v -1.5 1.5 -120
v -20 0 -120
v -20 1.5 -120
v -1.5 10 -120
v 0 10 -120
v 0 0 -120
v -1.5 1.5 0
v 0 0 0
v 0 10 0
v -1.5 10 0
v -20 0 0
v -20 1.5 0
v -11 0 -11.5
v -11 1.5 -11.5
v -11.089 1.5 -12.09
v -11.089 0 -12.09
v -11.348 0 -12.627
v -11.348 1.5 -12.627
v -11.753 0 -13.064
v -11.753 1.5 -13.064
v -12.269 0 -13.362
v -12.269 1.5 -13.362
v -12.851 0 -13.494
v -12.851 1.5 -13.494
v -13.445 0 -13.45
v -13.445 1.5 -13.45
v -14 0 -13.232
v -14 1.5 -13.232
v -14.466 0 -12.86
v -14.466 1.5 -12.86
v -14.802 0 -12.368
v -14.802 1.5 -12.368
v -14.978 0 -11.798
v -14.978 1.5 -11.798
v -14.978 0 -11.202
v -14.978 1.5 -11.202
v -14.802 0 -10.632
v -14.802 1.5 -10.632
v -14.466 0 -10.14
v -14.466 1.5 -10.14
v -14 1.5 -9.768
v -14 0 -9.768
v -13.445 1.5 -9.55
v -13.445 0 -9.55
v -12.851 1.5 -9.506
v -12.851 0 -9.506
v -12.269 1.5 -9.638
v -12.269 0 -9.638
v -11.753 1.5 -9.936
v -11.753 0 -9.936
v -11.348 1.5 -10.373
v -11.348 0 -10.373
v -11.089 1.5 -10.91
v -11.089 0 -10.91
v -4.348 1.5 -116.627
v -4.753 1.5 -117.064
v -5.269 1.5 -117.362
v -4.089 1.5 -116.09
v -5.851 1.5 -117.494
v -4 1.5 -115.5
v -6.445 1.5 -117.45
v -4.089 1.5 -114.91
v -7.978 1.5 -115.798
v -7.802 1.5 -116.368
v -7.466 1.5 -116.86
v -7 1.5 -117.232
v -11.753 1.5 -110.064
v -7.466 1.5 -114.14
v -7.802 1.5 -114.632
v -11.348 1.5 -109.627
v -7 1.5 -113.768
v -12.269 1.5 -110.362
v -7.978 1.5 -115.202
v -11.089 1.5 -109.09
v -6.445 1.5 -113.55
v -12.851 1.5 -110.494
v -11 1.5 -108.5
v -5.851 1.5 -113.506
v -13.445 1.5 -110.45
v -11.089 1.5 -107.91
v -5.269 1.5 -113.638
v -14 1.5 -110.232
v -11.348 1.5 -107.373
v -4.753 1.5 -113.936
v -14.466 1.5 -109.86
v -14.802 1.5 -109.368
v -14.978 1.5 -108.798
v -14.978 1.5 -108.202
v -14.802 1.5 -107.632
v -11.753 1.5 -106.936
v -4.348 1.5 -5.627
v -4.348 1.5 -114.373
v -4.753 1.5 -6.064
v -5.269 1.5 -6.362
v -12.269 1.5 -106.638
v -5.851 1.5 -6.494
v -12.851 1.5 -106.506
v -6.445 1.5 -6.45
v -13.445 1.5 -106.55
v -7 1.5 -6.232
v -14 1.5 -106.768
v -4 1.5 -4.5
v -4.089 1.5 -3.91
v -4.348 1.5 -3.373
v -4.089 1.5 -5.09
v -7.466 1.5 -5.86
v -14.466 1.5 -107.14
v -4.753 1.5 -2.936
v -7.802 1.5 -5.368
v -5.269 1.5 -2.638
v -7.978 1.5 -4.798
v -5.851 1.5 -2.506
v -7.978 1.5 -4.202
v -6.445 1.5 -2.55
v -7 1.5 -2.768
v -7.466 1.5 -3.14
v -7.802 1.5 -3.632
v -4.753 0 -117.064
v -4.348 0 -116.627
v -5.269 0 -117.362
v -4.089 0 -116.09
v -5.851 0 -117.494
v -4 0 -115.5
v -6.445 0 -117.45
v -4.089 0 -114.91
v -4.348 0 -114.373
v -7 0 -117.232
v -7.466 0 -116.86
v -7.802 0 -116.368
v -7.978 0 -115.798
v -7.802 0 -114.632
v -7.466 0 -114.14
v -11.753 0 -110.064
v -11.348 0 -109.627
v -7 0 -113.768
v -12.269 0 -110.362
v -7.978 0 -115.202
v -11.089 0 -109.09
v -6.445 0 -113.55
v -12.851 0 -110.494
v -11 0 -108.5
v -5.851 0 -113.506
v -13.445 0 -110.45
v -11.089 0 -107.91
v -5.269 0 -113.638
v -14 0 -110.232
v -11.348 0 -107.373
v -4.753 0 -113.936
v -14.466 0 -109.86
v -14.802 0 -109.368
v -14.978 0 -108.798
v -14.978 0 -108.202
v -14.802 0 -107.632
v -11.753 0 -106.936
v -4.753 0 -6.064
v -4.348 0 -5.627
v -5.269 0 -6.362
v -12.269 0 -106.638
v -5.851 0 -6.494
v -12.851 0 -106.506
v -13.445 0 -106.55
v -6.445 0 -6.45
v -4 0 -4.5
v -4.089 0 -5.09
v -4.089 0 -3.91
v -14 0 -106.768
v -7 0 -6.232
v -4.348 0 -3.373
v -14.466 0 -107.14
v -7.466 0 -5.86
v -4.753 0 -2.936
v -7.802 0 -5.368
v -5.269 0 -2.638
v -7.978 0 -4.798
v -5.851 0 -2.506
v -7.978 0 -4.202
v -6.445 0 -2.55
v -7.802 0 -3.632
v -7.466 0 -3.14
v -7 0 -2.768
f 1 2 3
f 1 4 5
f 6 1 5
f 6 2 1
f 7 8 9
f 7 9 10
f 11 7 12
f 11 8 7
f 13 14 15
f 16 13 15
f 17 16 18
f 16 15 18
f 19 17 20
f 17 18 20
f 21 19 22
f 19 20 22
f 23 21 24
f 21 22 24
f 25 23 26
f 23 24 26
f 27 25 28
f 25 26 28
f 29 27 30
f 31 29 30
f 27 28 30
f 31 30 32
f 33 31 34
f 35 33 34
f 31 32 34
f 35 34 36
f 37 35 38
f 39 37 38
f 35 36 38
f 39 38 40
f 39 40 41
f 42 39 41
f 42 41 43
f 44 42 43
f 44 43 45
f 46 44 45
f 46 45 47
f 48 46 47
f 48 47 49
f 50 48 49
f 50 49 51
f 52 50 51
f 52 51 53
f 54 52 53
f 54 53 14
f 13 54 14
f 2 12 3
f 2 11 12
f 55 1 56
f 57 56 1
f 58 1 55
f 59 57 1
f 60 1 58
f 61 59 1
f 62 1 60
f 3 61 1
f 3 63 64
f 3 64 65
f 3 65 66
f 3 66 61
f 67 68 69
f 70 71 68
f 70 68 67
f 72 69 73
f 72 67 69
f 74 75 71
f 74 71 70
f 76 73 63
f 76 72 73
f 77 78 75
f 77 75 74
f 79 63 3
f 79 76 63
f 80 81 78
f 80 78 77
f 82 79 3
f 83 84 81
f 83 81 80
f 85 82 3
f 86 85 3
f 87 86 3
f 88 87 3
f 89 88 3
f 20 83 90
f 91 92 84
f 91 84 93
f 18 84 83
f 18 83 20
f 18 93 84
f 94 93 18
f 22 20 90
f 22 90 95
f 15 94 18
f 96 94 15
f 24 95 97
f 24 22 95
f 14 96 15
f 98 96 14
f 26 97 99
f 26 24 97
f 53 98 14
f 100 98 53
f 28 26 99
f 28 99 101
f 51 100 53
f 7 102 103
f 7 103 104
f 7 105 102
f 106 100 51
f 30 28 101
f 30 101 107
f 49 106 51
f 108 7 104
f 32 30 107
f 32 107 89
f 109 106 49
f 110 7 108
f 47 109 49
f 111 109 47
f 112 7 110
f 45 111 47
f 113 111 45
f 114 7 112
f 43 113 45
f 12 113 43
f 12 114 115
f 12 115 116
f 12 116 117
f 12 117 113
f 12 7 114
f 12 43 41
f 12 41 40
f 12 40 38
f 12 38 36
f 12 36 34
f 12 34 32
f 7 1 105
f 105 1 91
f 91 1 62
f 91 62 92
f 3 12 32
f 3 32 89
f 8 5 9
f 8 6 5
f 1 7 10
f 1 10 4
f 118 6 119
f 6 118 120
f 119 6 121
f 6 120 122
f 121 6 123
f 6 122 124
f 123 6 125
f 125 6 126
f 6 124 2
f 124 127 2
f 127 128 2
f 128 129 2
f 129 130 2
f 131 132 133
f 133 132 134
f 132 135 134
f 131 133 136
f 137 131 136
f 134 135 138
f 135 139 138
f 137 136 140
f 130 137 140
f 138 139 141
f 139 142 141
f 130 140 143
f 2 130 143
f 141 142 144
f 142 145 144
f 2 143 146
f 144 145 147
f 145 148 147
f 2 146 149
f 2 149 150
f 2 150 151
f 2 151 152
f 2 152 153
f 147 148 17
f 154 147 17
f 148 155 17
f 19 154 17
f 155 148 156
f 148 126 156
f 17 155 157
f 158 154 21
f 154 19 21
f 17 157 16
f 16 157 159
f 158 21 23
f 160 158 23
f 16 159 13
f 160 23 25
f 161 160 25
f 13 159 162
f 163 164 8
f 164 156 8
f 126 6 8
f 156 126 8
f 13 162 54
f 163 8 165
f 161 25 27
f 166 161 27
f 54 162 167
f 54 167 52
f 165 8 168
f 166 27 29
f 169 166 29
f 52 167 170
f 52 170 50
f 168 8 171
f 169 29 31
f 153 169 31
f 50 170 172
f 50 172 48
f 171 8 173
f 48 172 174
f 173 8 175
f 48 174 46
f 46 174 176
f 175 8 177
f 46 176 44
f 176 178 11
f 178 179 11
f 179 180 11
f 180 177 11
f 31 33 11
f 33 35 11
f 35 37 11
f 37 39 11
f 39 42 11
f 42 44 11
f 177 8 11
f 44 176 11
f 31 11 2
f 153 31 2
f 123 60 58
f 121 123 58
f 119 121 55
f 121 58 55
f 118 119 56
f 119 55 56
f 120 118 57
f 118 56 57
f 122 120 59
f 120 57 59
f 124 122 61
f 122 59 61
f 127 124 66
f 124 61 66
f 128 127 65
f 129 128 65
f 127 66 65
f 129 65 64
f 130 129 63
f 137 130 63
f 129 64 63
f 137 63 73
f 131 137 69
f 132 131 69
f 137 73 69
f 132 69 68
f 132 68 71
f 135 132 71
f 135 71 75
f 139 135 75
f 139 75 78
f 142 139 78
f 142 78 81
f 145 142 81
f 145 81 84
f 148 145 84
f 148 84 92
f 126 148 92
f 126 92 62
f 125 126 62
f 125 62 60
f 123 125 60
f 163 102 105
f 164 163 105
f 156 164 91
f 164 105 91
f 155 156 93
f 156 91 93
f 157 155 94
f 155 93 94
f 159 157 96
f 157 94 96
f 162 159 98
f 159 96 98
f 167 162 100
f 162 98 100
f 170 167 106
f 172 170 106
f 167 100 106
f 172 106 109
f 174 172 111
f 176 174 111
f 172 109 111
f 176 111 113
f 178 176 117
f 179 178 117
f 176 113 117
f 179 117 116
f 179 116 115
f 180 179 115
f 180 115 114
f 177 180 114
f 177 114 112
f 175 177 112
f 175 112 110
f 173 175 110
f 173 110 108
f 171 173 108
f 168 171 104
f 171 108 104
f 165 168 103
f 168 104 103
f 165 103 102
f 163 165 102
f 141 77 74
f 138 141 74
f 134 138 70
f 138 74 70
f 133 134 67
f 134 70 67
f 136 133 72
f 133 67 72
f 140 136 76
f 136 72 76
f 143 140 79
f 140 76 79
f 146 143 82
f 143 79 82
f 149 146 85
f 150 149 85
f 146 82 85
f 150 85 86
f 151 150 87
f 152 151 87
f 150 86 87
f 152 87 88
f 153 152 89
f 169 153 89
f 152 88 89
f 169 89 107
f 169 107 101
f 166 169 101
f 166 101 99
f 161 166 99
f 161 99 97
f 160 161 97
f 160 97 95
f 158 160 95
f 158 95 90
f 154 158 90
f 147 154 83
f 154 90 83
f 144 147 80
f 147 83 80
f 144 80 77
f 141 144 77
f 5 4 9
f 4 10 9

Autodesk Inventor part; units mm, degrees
ref_plane "YZ Plane" through (0, 0, 0) normal (1, 0, 0) x (0, 1, 0)
ref_plane "XZ Plane" through (0, 0, 0) normal (0, 1, 0) x (-1, 0, 0)
ref_plane "XY Plane" through (0, 0, 0) normal (0, 0, 1) x (1, 0, 0)
sketch "Sketch1" plane through (0, 0, 0) normal (0, 1, 0) x (-1, 0, 0)
  line L0 (0, 0) -> (20, 0)
  line L1 (20, 0) -> (20, -120)
  line L2 (20, -120) -> (0, -120)
  line L3 (0, -120) -> (0, 0)
  dimension "d0" = 20
  dimension "d1" = 120
extrude "Extrusion1" add sketch "Sketch1" along normal blind 1.5
sketch "Sketch2" plane through (0, 0, 0) normal (0, -1, 0) x (1, 0, 0)
  line L0 (0, 0) -> (-1.5, 0)
  line L1 (-1.5, 0) -> (-1.5, -120)
  line L2 (-1.5, -120) -> (0, -120)
  line L3 (0, -120) -> (0, 0)
  dimension "d4" = 1.5
  dimension "d5" = 120
extrude "Extrusion2" add sketch "Sketch2" against normal blind 10
sketch "Sketch3" plane through (0, 1.5, 0) normal (0, 1, 0) x (1, 0, 0)
  line L0 (-20, 120) -> (-20, 0) projected
  line L1 (-20, 120) -> (-1.5, 120)
  line L2 (-1.5, 120) -> (-1.5, 101.5)
  line L3 (-1.5, 101.5) -> (-20, 101.5)
  line L4 (-20, 101.5) -> (-20, 120)
  line L5 (-20, 0) -> (-1.5, 0)
  line L6 (-1.5, 0) -> (-1.5, 18.5)
  line L7 (-1.5, 18.5) -> (-20, 18.5)
  line L8 (-20, 18.5) -> (-20, 0)
  line L9 (-20, 101.5) -> (-13, 101.5)
  line L10 (-13, 101.5) -> (-13, 108.5)
  line L11 (-13, 108.5) -> (-20, 108.5)
  line L12 (-20, 108.5) -> (-20, 101.5)
  line L13 (-20, 101.5) -> (-6, 101.5)
  line L14 (-6, 101.5) -> (-6, 115.5)
  line L15 (-6, 115.5) -> (-20, 115.5)
  line L16 (-20, 115.5) -> (-20, 101.5)
  circle A0 centre (-6, 115.5) radius 2
  circle A1 centre (-13, 108.5) radius 2
  line L17 (-20, 18.5) -> (-13, 18.5)
  line L18 (-13, 18.5) -> (-13, 11.5)
  line L19 (-13, 11.5) -> (-20, 11.5)
  line L20 (-20, 11.5) -> (-20, 18.5)
  line L21 (-20, 18.5) -> (-6, 18.5)
  line L22 (-6, 18.5) -> (-6, 4.5)
  line L23 (-6, 4.5) -> (-20, 4.5)
  line L24 (-20, 4.5) -> (-20, 18.5)
  circle A2 centre (-13, 11.5) radius 2
  circle A3 centre (-6, 4.5) radius 2
  point P0 (0, 0)
  dimension "d8" = 18.5
  dimension "d9" = 18.5
  dimension "d10" = 18.5
  dimension "d11" = 18.5
  dimension "d12" = 7
  dimension "d13" = 7
  dimension "d14" = 14
  dimension "d15" = 14
  dimension "d16" = 4
  dimension "d17" = 4
  dimension "d18" = 7
  dimension "d19" = 7
  dimension "d20" = 14
  dimension "d21" = 14
  dimension "d22" = 4
  dimension "d23" = 4
extrude "Extrusion3" cut sketch "Sketch3" against normal blind 10 contours A0 L14 L15 | L15 L14 A0 | A1 L10 L11 | L11 L10 A1 | A2 L18 L19 | L19 L18 A2 | A3 L22 L23 | L23 L22 A3
properties part number "aluminium_profile_1"
